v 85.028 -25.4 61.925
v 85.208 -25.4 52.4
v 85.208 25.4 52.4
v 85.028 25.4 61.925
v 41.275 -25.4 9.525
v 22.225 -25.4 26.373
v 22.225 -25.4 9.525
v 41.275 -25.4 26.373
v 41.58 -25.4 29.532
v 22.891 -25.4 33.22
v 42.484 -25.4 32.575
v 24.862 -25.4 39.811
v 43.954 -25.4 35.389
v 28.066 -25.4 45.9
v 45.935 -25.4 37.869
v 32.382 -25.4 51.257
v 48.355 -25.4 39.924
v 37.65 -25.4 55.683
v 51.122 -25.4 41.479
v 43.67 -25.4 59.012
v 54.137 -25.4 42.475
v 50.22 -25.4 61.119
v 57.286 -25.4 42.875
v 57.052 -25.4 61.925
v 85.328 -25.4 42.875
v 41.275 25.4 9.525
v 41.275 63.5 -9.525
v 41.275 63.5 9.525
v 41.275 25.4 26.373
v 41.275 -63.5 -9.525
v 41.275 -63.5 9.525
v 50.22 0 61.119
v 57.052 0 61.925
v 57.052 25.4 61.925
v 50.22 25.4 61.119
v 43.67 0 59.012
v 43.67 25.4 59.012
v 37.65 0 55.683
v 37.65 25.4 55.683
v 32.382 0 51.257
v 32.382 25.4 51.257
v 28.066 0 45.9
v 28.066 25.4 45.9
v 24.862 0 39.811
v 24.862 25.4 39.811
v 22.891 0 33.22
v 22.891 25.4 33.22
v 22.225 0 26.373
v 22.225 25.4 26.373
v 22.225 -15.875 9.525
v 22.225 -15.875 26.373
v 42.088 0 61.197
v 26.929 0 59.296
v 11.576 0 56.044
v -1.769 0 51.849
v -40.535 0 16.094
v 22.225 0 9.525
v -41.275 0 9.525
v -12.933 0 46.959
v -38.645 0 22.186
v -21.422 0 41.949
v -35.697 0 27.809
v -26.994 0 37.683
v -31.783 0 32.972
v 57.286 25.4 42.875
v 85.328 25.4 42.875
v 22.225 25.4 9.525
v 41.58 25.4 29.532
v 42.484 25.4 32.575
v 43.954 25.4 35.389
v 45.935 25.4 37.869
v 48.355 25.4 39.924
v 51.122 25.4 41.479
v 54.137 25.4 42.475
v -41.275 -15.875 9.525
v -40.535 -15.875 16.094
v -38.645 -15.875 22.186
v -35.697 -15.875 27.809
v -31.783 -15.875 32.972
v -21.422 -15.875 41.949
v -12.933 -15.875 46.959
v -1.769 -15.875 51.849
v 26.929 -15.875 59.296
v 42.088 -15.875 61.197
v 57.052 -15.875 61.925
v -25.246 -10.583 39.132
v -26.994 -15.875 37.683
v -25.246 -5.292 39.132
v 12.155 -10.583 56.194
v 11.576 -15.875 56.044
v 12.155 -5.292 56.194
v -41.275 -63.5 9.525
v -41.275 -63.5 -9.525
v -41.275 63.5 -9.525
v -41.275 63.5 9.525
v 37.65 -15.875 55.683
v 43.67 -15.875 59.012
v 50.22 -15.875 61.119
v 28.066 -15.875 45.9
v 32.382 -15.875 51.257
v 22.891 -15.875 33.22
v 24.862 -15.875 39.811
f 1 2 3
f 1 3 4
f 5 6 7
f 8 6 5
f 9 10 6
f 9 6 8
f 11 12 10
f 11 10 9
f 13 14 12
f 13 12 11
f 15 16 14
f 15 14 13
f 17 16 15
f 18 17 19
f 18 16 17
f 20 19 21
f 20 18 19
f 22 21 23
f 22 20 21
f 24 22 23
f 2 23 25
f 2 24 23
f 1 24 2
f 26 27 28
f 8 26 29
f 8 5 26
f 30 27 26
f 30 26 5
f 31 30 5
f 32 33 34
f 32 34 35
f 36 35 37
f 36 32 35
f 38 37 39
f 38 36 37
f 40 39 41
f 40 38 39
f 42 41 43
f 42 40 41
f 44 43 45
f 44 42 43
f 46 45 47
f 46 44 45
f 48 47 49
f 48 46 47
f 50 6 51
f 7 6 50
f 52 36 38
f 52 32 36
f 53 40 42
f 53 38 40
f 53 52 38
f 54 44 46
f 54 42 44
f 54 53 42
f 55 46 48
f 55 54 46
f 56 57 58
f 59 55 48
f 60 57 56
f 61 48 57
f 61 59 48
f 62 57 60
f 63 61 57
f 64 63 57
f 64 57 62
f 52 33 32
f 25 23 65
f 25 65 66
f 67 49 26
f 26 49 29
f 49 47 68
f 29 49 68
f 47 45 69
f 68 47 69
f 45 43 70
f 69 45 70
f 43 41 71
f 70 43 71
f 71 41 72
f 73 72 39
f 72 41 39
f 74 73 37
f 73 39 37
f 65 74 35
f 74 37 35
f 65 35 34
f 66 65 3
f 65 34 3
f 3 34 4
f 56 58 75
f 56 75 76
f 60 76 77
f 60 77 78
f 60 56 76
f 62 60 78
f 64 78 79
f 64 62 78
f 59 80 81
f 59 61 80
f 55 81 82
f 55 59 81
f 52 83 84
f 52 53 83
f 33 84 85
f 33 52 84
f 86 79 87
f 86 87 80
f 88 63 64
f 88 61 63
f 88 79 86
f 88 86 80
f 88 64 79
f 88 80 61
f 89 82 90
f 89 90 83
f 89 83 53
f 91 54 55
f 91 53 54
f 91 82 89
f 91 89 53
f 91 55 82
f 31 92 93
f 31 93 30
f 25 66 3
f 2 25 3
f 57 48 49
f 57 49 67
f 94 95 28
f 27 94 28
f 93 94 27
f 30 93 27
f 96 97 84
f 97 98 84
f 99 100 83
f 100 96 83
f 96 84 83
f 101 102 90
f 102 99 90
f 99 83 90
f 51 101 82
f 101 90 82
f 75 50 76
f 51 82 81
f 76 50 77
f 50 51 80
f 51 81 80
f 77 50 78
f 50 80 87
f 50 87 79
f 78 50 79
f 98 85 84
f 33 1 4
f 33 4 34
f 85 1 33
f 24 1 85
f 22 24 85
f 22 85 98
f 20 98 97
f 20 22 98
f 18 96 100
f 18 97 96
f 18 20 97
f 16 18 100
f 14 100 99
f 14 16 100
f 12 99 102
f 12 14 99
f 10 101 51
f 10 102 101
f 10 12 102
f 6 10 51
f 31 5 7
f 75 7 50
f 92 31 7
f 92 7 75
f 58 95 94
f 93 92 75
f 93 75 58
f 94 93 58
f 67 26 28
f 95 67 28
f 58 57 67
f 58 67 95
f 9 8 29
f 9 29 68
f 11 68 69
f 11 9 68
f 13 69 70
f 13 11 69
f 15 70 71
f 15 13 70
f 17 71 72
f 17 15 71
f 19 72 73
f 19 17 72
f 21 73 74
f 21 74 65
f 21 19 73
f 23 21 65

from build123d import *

# Parameters (mm, degrees)
F1_DEPTH = 63.5
F2_DEPTH = 15.875
F3_DEPTH = 25.4


with BuildPart() as f1:
    # F0 (on Front) → F1 (new body, symmetric)
    with BuildSketch(Plane.XZ):
        Polygon((-41.275, 9.525), (-41.275, -9.525), (41.275, -9.525), (41.275, 9.525), (22.225, 9.525), align=None)
    extrude(amount=F1_DEPTH, both=True)

    # F0 (on Front) → F2 (join)
    with BuildSketch(Plane.XZ):
        with BuildLine():
            add(Edge.make_bspline(
                [(-41.275, 9.525), (-40.5575186014, 45.8087362349), (13.0318803713, 61.4552721381), (57.0519533598, 61.9252)],
                knots=[0, 0, 0, 0, 111.4179999689, 111.4179999689, 111.4179999689, 111.4179999689], degree=3))
            Line((-41.275, 9.525), (22.225, 9.525))
            Line((22.225, 9.525), (22.225, 26.3727564465))
            ThreePointArc((22.225, 26.3727564465), (32.3824338056, 51.2569528518), (57.0519533598, 61.9252))
        make_face()
    extrude(amount=F2_DEPTH)

    # F0 (on Front) → F3 (join, symmetric)
    with BuildSketch(Plane.XZ):
        with BuildLine():
            Line((22.225, 9.525), (41.275, 9.525))
            Line((41.275, 9.525), (41.275, 26.3727564465))
            ThreePointArc((41.275, 26.3727564465), (45.935398186, 37.8691487872), (57.2855435312, 42.8752))
            Line((57.2855435312, 42.8752), (59.8077454329, 42.8752))
            Line((59.8077454329, 42.8752), (59.8077454329, 61.9252))
            Line((59.8077454329, 61.9252), (57.0519533598, 61.9252))
            ThreePointArc((57.0519533598, 61.9252), (32.3824338056, 51.2569528518), (22.225, 26.3727564465))
            Line((22.225, 26.3727564465), (22.225, 9.525))
        make_face()
        Polygon((85.0275978446, 61.9252), (59.8077454329, 61.9252), (59.8077454329, 42.8752), (85.327843825, 42.8752), (85.2077454329, 52.4002), align=None)
    extrude(amount=F3_DEPTH, both=True)


solid = f1.part
